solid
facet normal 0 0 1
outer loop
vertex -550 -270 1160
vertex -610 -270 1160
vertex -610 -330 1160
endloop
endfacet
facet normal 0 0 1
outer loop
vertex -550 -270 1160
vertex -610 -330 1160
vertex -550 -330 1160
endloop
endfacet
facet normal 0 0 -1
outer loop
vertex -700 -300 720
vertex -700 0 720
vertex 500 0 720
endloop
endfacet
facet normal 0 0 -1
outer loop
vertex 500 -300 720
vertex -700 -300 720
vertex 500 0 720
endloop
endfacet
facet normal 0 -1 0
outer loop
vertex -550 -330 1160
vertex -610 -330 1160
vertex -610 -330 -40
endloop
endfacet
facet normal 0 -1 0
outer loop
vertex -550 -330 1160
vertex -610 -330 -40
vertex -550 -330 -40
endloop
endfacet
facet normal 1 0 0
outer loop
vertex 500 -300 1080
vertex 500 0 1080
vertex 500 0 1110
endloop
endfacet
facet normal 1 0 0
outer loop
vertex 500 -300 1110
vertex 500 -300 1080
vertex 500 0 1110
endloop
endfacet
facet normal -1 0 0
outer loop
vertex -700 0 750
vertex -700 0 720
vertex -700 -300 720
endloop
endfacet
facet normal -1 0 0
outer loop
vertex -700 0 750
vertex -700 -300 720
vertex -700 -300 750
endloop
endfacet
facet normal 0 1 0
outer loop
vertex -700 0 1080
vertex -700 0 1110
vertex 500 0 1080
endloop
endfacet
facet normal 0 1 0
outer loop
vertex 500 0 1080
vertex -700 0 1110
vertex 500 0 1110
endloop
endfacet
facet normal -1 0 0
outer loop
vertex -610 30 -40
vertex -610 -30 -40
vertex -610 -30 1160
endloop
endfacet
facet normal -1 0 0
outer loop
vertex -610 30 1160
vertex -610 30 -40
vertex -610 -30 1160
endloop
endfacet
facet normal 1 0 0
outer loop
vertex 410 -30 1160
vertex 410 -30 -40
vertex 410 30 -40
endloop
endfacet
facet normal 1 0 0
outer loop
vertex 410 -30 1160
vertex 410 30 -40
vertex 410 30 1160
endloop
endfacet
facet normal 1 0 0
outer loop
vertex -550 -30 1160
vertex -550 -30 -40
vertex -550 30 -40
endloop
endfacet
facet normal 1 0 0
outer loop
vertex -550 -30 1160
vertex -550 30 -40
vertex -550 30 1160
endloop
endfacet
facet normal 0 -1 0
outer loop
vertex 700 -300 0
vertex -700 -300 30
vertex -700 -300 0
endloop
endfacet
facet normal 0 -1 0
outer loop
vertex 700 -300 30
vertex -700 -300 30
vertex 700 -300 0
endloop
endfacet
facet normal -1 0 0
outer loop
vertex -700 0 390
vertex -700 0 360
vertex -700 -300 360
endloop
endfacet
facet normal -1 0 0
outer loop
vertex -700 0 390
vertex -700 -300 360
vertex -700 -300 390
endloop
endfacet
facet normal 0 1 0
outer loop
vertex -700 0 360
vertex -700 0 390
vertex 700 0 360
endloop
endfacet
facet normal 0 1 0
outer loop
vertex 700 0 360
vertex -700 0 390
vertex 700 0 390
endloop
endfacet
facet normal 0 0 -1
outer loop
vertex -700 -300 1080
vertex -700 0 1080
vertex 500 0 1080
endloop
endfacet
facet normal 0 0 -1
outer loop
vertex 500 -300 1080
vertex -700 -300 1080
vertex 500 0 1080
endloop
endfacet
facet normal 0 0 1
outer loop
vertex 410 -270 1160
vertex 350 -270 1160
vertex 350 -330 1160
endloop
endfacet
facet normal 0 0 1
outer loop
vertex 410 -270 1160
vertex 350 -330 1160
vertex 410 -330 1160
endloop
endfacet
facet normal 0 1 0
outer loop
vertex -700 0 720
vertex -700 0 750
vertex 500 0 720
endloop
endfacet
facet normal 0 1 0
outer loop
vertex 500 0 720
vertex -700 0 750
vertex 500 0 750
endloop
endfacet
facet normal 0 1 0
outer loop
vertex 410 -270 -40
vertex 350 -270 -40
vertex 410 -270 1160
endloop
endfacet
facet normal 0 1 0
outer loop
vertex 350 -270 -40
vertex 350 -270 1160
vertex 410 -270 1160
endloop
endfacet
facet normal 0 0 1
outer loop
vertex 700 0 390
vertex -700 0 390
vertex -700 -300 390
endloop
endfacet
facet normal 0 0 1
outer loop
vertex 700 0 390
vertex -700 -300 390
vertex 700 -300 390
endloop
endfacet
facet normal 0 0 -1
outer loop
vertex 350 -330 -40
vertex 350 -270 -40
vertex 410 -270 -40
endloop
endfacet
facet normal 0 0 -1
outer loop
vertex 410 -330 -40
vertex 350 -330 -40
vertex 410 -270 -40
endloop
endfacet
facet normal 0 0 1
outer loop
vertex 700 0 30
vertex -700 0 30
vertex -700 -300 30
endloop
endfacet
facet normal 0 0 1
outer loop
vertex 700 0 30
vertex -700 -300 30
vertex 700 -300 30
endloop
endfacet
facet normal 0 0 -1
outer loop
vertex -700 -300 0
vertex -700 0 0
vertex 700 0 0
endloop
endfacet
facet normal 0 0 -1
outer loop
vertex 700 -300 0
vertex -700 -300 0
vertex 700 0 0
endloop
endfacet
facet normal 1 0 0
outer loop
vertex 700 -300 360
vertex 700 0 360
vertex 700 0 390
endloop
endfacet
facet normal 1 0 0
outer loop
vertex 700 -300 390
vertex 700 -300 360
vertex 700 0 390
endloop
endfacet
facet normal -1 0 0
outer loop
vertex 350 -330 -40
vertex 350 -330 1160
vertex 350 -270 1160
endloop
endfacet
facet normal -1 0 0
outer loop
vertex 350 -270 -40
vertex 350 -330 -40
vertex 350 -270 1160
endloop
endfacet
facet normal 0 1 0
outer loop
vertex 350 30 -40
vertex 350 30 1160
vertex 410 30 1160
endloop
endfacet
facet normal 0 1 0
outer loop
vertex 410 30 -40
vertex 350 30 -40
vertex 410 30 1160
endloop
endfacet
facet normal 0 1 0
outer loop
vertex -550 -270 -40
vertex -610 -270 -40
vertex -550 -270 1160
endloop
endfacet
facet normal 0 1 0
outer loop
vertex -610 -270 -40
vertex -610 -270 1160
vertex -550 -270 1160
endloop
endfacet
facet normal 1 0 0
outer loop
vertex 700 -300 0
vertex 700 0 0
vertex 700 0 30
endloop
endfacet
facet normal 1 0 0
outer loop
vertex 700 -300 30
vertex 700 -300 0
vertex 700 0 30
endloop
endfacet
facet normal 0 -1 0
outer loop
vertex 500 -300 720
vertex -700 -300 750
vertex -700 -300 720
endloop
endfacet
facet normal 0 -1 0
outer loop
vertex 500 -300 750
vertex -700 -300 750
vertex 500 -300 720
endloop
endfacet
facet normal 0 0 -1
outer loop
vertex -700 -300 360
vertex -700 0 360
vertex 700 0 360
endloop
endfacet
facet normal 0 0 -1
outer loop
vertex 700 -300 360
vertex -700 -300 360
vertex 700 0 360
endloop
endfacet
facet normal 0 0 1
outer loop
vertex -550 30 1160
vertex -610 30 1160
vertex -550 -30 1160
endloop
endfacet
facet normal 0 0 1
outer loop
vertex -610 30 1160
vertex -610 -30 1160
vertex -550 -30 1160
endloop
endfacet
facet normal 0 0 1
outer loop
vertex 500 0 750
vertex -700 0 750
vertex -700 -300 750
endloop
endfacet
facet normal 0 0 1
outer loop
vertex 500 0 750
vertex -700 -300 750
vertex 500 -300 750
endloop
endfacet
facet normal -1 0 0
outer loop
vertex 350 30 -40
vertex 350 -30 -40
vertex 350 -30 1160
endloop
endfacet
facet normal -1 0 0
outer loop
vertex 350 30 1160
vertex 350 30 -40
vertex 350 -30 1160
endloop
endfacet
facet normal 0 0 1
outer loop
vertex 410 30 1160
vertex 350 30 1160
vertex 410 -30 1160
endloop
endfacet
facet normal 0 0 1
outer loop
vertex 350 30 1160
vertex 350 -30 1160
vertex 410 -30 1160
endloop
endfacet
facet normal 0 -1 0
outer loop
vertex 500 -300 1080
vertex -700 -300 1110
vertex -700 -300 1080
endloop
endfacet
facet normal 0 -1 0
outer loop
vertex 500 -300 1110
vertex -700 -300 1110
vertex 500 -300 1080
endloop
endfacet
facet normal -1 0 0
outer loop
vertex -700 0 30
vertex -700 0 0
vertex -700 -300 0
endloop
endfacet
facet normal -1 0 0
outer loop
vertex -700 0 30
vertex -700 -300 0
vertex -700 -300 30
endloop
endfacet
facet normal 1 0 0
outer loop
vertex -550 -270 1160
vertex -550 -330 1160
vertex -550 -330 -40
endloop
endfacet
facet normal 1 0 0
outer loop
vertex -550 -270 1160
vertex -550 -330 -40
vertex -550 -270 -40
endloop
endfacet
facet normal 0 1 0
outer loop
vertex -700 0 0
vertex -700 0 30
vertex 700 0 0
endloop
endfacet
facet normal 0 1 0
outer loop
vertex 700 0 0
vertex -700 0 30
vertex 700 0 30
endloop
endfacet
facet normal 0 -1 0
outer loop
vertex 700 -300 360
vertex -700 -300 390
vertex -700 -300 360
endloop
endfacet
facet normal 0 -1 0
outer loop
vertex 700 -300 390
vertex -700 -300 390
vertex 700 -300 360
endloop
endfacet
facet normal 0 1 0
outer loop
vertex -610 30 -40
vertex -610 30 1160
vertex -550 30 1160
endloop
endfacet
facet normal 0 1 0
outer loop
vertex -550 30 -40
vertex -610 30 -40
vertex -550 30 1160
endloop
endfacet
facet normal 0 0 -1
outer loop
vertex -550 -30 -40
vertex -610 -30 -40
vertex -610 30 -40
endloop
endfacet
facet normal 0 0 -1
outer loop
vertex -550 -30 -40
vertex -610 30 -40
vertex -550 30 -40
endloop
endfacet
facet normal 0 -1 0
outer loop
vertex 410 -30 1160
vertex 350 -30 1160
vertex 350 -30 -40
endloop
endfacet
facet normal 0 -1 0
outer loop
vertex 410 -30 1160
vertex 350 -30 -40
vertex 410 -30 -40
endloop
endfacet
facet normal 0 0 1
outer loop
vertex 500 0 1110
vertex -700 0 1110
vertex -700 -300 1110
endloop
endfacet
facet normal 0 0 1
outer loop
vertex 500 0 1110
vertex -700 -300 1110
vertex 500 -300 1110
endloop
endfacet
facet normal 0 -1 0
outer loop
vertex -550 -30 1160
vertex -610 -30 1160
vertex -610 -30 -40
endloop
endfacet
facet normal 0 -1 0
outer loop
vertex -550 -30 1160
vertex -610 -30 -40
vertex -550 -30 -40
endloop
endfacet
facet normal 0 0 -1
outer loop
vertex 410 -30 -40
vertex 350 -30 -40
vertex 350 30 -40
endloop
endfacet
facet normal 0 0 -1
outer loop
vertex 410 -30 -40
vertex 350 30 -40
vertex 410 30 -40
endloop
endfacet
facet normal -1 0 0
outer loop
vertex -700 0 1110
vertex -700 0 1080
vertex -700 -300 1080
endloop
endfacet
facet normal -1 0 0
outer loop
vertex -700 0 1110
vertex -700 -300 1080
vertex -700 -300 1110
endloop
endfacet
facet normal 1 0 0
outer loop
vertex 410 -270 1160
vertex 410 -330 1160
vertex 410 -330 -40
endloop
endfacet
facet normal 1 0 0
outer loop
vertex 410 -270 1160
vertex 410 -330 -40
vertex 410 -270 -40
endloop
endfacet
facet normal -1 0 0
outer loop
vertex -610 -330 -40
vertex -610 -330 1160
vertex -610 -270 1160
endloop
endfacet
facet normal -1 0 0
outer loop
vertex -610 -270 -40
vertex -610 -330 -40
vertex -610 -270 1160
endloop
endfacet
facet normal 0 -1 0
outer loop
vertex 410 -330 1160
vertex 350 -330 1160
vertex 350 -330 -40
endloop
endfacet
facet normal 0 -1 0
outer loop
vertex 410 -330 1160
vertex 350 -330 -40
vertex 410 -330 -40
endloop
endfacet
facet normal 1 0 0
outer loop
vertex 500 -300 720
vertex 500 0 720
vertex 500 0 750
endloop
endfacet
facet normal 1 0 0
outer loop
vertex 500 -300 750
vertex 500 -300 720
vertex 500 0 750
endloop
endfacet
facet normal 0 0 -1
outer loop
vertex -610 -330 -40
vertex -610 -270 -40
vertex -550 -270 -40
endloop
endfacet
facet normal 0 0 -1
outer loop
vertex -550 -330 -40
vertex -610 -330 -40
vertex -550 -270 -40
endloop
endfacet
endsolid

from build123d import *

# Parameters (mm, degrees)
F0_W           = 1400
F0_H           = 30
F6_DEPTH       = 300
F1_W           = 1400
F1_H           = 30
F2_W           = 1200
F2_H           = 30
F3_W           = 1200
F3_H           = 30
F7_DEPTH       = 300
F4_W           = 60
F4_H           = 1200
F8_DEPTH       = 30
F9_W           = 60
F9_H           = 60
F10_DEPTH      = 1160
F10_DEPTH_BACK = 40
F11_W          = 60
F11_H          = 60
F12_DEPTH      = 1160
F12_DEPTH_BACK = 40
F5_W           = 60
F5_H           = 1200
F13_DEPTH      = 30


with BuildPart() as f6:
    # F0 (on Front) → F6 (new body)
    with BuildSketch(Plane.XZ):
        with Locations((0, 15)):
            Rectangle(F0_W, F0_H)
    extrude(amount=F6_DEPTH)


with BuildPart() as f7:
    # F1 (on Front) + F2 (on Front) + F3 (on Front) → F7 (new body)
    with BuildSketch(Plane.XZ):
        with Locations((0, 375)):
            Rectangle(F1_W, F1_H)
    with BuildSketch(Plane.XZ):
        with Locations((-100, 735)):
            Rectangle(F2_W, F2_H)
    with BuildSketch(Plane.XZ):
        with Locations((-100, 1095)):
            Rectangle(F3_W, F3_H)
    extrude(amount=F7_DEPTH)


with BuildPart() as f8:
    # F4 (on Front) → F8 (new body, symmetric)
    with BuildSketch(Plane.XZ):
        with Locations((-580, 560)):
            Rectangle(F4_W, F4_H)
    extrude(amount=F8_DEPTH, both=True)


with BuildPart() as f10:
    # F9 (on Top) → F10 (new body, two sides)
    with BuildSketch(Plane.XY) as f10_sk:
        with Locations((-580, -300)):
            Rectangle(F9_W, F9_H)
    extrude(amount=F10_DEPTH)
    extrude(f10_sk.sketch, amount=-F10_DEPTH_BACK)


with BuildPart() as f12:
    # F11 (on Top) → F12 (new body, two sides)
    with BuildSketch(Plane.XY) as f12_sk:
        with Locations((380, -300)):
            Rectangle(F11_W, F11_H)
    extrude(amount=F12_DEPTH)
    extrude(f12_sk.sketch, amount=-F12_DEPTH_BACK)


with BuildPart() as f13:
    # F5 (on Front) → F13 (new body, symmetric)
    with BuildSketch(Plane.XZ):
        with Locations((380, 560)):
            Rectangle(F5_W, F5_H)
    extrude(amount=F13_DEPTH, both=True)


solid = Compound([f6.part, f7.part, f8.part, f10.part, f12.part, f13.part])
